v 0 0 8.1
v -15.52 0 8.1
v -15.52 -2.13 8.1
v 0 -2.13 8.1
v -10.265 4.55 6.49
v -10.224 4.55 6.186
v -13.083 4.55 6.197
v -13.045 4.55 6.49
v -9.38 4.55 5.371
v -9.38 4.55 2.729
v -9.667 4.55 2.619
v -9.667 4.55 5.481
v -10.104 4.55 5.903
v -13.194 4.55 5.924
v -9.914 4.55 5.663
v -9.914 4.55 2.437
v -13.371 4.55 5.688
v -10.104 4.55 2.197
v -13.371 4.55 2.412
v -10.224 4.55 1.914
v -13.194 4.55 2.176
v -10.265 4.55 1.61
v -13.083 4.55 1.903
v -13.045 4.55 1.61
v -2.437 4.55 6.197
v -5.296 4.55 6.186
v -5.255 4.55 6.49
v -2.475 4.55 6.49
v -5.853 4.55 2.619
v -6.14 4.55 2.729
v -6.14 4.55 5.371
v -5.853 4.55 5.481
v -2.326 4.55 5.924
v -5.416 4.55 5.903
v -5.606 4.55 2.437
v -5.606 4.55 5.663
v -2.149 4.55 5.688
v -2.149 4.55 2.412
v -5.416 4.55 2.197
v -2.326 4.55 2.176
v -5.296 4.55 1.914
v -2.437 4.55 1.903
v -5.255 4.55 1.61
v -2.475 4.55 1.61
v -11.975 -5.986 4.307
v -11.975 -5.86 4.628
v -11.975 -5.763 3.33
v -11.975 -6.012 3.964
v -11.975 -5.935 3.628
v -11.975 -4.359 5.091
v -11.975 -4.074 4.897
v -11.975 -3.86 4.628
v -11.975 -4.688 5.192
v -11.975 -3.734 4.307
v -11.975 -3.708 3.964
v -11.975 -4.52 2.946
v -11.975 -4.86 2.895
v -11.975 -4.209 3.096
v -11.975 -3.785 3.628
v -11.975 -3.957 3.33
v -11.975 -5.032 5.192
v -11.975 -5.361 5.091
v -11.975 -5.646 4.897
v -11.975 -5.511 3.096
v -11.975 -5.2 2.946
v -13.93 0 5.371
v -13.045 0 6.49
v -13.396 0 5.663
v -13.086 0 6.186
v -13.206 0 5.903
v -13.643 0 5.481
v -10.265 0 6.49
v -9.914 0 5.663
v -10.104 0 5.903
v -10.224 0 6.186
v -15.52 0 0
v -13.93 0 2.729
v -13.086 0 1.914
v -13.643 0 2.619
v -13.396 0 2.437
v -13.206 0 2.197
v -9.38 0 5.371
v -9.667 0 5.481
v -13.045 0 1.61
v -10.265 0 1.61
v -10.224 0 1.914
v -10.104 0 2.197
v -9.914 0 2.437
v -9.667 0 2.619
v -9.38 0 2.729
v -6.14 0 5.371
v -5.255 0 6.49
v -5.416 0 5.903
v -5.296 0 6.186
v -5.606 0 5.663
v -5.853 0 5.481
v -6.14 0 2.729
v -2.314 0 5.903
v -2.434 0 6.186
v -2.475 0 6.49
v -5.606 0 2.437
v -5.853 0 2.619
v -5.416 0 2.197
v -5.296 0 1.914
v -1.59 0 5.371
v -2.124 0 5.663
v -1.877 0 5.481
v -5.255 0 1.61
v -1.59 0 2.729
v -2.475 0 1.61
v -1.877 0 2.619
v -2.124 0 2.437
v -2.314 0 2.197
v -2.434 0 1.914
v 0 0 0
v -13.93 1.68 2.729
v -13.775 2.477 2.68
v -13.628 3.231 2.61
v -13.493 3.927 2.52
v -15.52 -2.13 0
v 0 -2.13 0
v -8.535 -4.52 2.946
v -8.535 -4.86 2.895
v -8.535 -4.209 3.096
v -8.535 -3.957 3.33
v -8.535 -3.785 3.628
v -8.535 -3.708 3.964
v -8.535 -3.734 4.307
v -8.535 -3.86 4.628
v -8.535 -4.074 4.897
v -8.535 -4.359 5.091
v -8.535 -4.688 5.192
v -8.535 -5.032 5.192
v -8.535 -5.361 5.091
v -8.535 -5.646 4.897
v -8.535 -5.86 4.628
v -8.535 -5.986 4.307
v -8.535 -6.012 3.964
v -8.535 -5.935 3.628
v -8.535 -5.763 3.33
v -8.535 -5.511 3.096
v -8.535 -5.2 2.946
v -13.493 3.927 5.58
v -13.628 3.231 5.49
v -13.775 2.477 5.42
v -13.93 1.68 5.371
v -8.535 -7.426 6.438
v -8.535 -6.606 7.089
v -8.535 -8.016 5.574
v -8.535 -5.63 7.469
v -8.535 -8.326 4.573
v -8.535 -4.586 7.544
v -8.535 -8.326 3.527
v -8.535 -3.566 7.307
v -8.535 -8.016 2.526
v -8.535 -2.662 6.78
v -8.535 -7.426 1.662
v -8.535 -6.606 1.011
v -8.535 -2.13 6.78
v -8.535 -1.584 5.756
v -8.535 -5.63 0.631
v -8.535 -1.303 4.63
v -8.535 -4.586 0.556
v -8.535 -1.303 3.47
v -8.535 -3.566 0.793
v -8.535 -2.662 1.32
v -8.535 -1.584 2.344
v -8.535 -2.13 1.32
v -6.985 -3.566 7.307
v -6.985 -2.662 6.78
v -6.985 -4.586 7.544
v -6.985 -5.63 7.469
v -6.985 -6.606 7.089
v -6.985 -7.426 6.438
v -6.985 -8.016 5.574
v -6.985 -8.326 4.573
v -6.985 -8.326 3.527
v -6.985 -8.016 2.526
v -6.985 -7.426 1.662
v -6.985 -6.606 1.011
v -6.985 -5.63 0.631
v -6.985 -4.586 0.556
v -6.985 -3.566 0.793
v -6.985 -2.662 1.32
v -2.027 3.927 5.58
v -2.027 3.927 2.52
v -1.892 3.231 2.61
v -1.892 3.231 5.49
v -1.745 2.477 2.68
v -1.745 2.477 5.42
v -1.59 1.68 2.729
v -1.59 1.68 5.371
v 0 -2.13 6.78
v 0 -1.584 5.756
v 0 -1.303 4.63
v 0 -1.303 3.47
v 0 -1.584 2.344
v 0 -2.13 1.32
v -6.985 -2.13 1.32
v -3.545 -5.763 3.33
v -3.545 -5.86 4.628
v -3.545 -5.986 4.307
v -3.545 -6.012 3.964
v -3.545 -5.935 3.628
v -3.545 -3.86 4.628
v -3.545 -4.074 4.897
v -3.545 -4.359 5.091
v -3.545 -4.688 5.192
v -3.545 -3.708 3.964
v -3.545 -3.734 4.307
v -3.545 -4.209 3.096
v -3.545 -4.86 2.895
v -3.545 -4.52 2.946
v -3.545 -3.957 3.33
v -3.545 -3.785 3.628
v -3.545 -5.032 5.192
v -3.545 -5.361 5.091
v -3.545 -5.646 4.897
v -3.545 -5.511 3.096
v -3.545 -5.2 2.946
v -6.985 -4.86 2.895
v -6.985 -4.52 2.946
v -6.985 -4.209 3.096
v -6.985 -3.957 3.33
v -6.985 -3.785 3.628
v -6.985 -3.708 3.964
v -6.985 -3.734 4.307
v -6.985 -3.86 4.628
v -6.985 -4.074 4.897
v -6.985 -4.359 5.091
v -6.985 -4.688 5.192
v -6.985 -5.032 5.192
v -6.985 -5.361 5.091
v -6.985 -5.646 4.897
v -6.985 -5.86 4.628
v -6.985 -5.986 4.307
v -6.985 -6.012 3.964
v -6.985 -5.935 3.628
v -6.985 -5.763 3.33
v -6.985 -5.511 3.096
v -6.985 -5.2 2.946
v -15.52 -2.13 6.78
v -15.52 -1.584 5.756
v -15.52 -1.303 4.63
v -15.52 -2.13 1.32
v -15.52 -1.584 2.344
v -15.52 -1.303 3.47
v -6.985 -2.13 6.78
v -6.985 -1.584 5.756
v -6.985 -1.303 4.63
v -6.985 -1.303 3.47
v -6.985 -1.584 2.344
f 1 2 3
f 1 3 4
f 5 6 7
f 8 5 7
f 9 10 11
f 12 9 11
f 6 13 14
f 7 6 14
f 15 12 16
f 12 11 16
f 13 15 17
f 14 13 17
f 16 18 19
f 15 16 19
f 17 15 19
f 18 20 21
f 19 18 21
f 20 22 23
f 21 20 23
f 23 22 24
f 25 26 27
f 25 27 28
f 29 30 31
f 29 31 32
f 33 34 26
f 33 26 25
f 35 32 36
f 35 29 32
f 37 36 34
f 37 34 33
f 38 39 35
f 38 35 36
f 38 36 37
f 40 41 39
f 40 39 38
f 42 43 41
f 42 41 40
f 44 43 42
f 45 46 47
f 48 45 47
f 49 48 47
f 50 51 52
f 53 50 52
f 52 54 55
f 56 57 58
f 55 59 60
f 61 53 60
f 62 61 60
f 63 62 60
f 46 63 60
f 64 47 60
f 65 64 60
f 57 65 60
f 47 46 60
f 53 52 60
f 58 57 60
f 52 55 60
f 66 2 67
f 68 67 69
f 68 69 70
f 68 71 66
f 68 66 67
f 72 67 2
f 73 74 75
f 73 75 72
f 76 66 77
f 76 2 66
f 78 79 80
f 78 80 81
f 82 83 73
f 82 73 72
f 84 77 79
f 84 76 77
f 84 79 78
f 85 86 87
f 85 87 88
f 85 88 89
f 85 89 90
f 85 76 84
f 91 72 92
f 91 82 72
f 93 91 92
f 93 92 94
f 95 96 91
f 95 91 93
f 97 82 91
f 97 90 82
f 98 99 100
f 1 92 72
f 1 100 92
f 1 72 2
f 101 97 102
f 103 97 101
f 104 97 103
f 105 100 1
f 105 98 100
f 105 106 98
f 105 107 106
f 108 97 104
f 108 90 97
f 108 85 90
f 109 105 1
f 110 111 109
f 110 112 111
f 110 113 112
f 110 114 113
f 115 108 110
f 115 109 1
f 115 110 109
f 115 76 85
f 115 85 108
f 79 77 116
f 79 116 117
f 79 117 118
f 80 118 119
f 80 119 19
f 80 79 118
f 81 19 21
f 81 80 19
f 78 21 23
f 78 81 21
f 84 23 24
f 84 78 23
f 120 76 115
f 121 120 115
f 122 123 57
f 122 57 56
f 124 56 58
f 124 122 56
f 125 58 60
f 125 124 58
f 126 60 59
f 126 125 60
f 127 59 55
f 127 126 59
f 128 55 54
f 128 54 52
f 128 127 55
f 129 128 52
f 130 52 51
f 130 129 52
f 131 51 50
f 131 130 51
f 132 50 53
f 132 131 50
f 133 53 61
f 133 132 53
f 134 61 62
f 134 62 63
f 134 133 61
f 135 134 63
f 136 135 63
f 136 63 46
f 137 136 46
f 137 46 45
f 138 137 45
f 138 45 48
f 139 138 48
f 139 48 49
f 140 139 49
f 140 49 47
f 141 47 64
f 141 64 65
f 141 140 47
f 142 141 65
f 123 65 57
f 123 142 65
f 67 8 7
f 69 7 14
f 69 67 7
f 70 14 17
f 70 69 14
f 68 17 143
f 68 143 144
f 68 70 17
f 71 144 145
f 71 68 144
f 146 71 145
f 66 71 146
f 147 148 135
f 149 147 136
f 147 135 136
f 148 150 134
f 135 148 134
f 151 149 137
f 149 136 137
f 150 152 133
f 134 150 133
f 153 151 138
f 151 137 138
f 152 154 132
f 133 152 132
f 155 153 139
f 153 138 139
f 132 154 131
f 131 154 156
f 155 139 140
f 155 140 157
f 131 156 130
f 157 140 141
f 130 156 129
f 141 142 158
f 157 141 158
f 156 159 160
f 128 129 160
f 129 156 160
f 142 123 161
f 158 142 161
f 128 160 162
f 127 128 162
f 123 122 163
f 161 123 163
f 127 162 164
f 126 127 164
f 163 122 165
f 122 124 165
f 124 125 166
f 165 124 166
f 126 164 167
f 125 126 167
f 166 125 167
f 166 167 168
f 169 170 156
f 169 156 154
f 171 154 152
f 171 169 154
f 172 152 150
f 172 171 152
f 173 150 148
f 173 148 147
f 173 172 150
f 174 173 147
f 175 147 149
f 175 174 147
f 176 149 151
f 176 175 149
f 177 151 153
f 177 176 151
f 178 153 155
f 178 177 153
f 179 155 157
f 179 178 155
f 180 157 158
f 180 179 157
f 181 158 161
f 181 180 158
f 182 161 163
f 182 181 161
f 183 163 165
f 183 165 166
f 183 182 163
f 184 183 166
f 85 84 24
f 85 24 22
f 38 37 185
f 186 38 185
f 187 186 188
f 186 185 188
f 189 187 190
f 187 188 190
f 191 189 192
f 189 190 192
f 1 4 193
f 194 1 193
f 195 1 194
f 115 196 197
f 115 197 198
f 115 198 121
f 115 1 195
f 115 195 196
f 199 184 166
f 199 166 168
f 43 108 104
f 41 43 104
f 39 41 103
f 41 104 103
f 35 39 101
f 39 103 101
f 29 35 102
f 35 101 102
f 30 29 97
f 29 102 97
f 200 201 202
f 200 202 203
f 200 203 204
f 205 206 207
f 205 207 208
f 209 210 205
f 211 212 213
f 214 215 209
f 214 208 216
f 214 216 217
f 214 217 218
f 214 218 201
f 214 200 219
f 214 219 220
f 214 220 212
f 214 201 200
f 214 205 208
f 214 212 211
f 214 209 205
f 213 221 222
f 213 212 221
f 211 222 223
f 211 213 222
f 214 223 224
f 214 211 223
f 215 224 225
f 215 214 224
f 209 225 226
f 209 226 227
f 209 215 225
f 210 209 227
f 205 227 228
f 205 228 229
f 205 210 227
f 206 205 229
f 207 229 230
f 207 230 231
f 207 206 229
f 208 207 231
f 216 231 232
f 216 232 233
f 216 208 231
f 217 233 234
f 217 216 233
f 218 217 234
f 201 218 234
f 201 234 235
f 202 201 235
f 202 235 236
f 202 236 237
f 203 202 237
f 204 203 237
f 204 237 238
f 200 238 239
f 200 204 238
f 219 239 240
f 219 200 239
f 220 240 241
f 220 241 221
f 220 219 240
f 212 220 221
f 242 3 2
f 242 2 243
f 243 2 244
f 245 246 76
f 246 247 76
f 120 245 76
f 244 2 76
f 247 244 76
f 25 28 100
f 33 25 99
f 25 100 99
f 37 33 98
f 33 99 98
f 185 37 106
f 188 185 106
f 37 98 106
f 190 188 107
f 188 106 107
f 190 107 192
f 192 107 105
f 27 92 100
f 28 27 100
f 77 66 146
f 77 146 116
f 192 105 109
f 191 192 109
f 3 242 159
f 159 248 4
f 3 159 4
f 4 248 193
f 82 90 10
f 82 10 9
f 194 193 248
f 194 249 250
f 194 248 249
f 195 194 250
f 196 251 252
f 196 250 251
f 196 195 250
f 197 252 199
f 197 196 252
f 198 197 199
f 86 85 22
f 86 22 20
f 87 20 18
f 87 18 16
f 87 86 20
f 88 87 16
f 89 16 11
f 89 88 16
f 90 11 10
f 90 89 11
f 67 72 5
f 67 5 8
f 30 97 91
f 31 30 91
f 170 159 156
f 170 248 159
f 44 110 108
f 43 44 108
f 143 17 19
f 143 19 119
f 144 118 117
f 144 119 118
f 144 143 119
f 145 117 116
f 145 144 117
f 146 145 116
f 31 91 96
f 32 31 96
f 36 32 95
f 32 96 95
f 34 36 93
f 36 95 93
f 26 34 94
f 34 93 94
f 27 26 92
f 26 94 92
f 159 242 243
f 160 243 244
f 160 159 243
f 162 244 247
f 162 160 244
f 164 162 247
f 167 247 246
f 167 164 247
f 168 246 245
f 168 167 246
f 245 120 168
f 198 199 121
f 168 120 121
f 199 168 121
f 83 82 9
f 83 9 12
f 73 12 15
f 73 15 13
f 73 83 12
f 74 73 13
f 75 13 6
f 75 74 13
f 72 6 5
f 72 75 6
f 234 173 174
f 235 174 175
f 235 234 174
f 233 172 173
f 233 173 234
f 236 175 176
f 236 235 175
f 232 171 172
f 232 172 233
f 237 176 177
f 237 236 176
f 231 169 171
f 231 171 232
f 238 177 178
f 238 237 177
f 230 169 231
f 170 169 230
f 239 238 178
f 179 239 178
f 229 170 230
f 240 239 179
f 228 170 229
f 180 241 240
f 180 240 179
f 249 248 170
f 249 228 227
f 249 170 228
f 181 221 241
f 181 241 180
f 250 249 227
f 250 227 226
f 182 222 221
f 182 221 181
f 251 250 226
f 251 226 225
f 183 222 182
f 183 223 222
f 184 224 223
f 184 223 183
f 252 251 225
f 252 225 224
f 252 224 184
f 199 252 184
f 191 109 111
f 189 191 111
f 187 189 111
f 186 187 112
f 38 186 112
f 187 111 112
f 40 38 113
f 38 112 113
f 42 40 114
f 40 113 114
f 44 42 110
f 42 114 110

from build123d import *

# Parameters (mm, degrees)
IZIM3_W                     = 15.52
IZIM3_H                     = 8.1
Y_KSEKLIK_EKSTR_ZYON1_DEPTH = 2.13
Y_KSEKLIK_EKSTR_ZYON2_DEPTH = 4.55
KES_EKSTR_ZYON2_DEPTH       = 12.275
KES_EKSTR_ZYON3_DEPTH       = 12.275
KES_EKSTR_ZYON4_DEPTH       = 16.52
IZIM10_R                    = 3.505
IZIM10_R_2                  = 1.155
Y_KSEKLIK_EKSTR_ZYON4_DEPTH = 0.775
IZIM11_R                    = 1.155
Y_KSEKLIK_EKSTR_ZYON5_DEPTH = 4.215


with BuildPart() as part:
    # Çizim3 → Yükseklik-Ekstrüzyon1 (new body)
    with BuildSketch(Plane(origin=(0, 0, 0), x_dir=(1, 0, 0), z_dir=(0, 1, 0))):
        with Locations((-7.76, -4.05)):
            Rectangle(IZIM3_W, IZIM3_H)
    extrude(amount=-Y_KSEKLIK_EKSTR_ZYON1_DEPTH)

    # Çizim4 → Yükseklik-Ekstrüzyon2 (add)
    with BuildSketch(Plane(origin=(0, 0, 0), x_dir=(1, 0, 0), z_dir=(0, 1, 0))):
        with BuildLine():
            Line((-13.045, -1.61), (-10.265, -1.61))
            ThreePointArc((-10.265, -1.61), (-10.017011641, -2.32335475), (-9.38, -2.729050937))
            Line((-9.38, -2.729050937), (-9.38, -5.370949063))
            ThreePointArc((-9.38, -5.370949063), (-10.017011641, -5.77664525), (-10.265, -6.49))
            Line((-10.265, -6.49), (-13.045, -6.49))
            ThreePointArc((-13.045, -6.49), (-13.292988359, -5.77664525), (-13.93, -5.370949063))
            Line((-13.93, -5.370949063), (-13.93, -2.729050937))
            ThreePointArc((-13.93, -2.729050937), (-13.292988359, -2.32335475), (-13.045, -1.61))
        make_face()
        with BuildLine():
            Line((-6.14, -2.729050937), (-6.14, -5.370949063))
            ThreePointArc((-6.14, -5.370949063), (-5.502988359, -5.77664525), (-5.255, -6.49))
            Line((-5.255, -6.49), (-2.475, -6.49))
            ThreePointArc((-2.475, -6.49), (-2.227011641, -5.77664525), (-1.59, -5.370949063))
            Line((-1.59, -5.370949063), (-1.59, -2.729050937))
            ThreePointArc((-1.59, -2.729050937), (-2.227011641, -2.32335475), (-2.475, -1.61))
            Line((-2.475, -1.61), (-5.255, -1.61))
            ThreePointArc((-5.255, -1.61), (-5.502988359, -2.32335475), (-6.14, -2.729050937))
        make_face()
    extrude(amount=Y_KSEKLIK_EKSTR_ZYON2_DEPTH)

    # Çizim6 → Kes-Ekstrüzyon2 (cut, symmetric)
    with BuildSketch(Plane.XY.offset(5.370949063)):
        Polygon((-1.59, 1.68), (-1.59, 4.55), (-2.148911229, 4.55), align=None)
    extrude(amount=KES_EKSTR_ZYON2_DEPTH, both=True, mode=Mode.SUBTRACT)

    # Çizim7 → Kes-Ekstrüzyon3 (cut, symmetric)
    with BuildSketch(Plane.XY.offset(5.370949063)):
        Polygon((-13.93, 4.55), (-13.371088771, 4.55), (-13.93, 1.68), align=None)
    extrude(amount=KES_EKSTR_ZYON3_DEPTH, both=True, mode=Mode.SUBTRACT)

    # Çizim8 → Kes-Ekstrüzyon4 (cut, through all)
    with BuildSketch(Plane(origin=(0, 0, 0), x_dir=(0, 0, -1), z_dir=(1, 0, 0))):
        with BuildLine():
            ThreePointArc((-6.78, -2.13), (-4.05, -1.267106893), (-1.32, -2.13))
            Line((-1.32, -2.13), (-6.78, -2.13))
        make_face()
    extrude(amount=-KES_EKSTR_ZYON4_DEPTH, mode=Mode.SUBTRACT)

    # Çizim10 → Yükseklik-Ekstrüzyon4 (add, symmetric)
    with BuildSketch(Plane(origin=(-7.76, 0, 0), x_dir=(0, 0, -1), z_dir=(1, 0, 0))):
        with BuildLine():
            Line((-6.78, -2.13), (-6.78, -2.661790501))
            ThreePointArc((-6.78, -2.661790501), (-4.05, -1.355), (-1.32, -2.661790501))
            Line((-1.32, -2.661790501), (-1.32, -2.13))
            ThreePointArc((-1.32, -2.13), (-4.05, -1.267106893), (-6.78, -2.13))
        make_face()
        with Locations((-4.05, -4.86)):
            Circle(IZIM10_R)
        with Locations((-4.05, -4.86)):
            Circle(IZIM10_R_2, mode=Mode.SUBTRACT)
    extrude(amount=Y_KSEKLIK_EKSTR_ZYON4_DEPTH, both=True)

    # Çizim11 → Yükseklik-Ekstrüzyon5 (add, symmetric)
    with BuildSketch(Plane(origin=(-7.76, 0, 0), x_dir=(0, 0, -1), z_dir=(1, 0, 0))):
        with Locations((-4.05, -4.86)):
            Circle(IZIM11_R)
    extrude(amount=Y_KSEKLIK_EKSTR_ZYON5_DEPTH, both=True)


solid = part.part
